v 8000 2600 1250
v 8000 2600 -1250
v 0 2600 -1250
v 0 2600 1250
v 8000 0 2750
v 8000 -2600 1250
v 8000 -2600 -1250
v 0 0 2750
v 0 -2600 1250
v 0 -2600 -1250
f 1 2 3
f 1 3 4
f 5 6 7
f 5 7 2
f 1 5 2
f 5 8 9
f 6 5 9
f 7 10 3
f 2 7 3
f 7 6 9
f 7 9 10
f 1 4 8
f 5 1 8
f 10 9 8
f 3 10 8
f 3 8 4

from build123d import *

# Parameters (mm, degrees)
F0_W     = 1250
F0_H     = 900
F0_W_2   = 900
F0_H_2   = 2055
F1_DEPTH = 8000


# Not quite as in the source:
# - the program builds the solid bodies; features that only make, move or delete a surface that nothing else refers to are left out


with BuildPart() as f1:
    # F0 (on Right) → F1 (new body)
    with BuildSketch(Plane.YZ):
        Polygon((-340, -1250), (2600, -1250), (2600, 1250), (0, 2750), (-2600, 1250), (-2600, -1250), (-1240, -1250), (-1240, 805), (-340, 805), align=None)
        with Locations((1175, 355)):
            Rectangle(F0_W, F0_H, mode=Mode.SUBTRACT)
        with Locations((-790, -222.5)):
            Rectangle(F0_W_2, F0_H_2)
        with Locations((1175, 355)):
            Rectangle(F0_W, F0_H)
    extrude(amount=F1_DEPTH)


solid = f1.part
